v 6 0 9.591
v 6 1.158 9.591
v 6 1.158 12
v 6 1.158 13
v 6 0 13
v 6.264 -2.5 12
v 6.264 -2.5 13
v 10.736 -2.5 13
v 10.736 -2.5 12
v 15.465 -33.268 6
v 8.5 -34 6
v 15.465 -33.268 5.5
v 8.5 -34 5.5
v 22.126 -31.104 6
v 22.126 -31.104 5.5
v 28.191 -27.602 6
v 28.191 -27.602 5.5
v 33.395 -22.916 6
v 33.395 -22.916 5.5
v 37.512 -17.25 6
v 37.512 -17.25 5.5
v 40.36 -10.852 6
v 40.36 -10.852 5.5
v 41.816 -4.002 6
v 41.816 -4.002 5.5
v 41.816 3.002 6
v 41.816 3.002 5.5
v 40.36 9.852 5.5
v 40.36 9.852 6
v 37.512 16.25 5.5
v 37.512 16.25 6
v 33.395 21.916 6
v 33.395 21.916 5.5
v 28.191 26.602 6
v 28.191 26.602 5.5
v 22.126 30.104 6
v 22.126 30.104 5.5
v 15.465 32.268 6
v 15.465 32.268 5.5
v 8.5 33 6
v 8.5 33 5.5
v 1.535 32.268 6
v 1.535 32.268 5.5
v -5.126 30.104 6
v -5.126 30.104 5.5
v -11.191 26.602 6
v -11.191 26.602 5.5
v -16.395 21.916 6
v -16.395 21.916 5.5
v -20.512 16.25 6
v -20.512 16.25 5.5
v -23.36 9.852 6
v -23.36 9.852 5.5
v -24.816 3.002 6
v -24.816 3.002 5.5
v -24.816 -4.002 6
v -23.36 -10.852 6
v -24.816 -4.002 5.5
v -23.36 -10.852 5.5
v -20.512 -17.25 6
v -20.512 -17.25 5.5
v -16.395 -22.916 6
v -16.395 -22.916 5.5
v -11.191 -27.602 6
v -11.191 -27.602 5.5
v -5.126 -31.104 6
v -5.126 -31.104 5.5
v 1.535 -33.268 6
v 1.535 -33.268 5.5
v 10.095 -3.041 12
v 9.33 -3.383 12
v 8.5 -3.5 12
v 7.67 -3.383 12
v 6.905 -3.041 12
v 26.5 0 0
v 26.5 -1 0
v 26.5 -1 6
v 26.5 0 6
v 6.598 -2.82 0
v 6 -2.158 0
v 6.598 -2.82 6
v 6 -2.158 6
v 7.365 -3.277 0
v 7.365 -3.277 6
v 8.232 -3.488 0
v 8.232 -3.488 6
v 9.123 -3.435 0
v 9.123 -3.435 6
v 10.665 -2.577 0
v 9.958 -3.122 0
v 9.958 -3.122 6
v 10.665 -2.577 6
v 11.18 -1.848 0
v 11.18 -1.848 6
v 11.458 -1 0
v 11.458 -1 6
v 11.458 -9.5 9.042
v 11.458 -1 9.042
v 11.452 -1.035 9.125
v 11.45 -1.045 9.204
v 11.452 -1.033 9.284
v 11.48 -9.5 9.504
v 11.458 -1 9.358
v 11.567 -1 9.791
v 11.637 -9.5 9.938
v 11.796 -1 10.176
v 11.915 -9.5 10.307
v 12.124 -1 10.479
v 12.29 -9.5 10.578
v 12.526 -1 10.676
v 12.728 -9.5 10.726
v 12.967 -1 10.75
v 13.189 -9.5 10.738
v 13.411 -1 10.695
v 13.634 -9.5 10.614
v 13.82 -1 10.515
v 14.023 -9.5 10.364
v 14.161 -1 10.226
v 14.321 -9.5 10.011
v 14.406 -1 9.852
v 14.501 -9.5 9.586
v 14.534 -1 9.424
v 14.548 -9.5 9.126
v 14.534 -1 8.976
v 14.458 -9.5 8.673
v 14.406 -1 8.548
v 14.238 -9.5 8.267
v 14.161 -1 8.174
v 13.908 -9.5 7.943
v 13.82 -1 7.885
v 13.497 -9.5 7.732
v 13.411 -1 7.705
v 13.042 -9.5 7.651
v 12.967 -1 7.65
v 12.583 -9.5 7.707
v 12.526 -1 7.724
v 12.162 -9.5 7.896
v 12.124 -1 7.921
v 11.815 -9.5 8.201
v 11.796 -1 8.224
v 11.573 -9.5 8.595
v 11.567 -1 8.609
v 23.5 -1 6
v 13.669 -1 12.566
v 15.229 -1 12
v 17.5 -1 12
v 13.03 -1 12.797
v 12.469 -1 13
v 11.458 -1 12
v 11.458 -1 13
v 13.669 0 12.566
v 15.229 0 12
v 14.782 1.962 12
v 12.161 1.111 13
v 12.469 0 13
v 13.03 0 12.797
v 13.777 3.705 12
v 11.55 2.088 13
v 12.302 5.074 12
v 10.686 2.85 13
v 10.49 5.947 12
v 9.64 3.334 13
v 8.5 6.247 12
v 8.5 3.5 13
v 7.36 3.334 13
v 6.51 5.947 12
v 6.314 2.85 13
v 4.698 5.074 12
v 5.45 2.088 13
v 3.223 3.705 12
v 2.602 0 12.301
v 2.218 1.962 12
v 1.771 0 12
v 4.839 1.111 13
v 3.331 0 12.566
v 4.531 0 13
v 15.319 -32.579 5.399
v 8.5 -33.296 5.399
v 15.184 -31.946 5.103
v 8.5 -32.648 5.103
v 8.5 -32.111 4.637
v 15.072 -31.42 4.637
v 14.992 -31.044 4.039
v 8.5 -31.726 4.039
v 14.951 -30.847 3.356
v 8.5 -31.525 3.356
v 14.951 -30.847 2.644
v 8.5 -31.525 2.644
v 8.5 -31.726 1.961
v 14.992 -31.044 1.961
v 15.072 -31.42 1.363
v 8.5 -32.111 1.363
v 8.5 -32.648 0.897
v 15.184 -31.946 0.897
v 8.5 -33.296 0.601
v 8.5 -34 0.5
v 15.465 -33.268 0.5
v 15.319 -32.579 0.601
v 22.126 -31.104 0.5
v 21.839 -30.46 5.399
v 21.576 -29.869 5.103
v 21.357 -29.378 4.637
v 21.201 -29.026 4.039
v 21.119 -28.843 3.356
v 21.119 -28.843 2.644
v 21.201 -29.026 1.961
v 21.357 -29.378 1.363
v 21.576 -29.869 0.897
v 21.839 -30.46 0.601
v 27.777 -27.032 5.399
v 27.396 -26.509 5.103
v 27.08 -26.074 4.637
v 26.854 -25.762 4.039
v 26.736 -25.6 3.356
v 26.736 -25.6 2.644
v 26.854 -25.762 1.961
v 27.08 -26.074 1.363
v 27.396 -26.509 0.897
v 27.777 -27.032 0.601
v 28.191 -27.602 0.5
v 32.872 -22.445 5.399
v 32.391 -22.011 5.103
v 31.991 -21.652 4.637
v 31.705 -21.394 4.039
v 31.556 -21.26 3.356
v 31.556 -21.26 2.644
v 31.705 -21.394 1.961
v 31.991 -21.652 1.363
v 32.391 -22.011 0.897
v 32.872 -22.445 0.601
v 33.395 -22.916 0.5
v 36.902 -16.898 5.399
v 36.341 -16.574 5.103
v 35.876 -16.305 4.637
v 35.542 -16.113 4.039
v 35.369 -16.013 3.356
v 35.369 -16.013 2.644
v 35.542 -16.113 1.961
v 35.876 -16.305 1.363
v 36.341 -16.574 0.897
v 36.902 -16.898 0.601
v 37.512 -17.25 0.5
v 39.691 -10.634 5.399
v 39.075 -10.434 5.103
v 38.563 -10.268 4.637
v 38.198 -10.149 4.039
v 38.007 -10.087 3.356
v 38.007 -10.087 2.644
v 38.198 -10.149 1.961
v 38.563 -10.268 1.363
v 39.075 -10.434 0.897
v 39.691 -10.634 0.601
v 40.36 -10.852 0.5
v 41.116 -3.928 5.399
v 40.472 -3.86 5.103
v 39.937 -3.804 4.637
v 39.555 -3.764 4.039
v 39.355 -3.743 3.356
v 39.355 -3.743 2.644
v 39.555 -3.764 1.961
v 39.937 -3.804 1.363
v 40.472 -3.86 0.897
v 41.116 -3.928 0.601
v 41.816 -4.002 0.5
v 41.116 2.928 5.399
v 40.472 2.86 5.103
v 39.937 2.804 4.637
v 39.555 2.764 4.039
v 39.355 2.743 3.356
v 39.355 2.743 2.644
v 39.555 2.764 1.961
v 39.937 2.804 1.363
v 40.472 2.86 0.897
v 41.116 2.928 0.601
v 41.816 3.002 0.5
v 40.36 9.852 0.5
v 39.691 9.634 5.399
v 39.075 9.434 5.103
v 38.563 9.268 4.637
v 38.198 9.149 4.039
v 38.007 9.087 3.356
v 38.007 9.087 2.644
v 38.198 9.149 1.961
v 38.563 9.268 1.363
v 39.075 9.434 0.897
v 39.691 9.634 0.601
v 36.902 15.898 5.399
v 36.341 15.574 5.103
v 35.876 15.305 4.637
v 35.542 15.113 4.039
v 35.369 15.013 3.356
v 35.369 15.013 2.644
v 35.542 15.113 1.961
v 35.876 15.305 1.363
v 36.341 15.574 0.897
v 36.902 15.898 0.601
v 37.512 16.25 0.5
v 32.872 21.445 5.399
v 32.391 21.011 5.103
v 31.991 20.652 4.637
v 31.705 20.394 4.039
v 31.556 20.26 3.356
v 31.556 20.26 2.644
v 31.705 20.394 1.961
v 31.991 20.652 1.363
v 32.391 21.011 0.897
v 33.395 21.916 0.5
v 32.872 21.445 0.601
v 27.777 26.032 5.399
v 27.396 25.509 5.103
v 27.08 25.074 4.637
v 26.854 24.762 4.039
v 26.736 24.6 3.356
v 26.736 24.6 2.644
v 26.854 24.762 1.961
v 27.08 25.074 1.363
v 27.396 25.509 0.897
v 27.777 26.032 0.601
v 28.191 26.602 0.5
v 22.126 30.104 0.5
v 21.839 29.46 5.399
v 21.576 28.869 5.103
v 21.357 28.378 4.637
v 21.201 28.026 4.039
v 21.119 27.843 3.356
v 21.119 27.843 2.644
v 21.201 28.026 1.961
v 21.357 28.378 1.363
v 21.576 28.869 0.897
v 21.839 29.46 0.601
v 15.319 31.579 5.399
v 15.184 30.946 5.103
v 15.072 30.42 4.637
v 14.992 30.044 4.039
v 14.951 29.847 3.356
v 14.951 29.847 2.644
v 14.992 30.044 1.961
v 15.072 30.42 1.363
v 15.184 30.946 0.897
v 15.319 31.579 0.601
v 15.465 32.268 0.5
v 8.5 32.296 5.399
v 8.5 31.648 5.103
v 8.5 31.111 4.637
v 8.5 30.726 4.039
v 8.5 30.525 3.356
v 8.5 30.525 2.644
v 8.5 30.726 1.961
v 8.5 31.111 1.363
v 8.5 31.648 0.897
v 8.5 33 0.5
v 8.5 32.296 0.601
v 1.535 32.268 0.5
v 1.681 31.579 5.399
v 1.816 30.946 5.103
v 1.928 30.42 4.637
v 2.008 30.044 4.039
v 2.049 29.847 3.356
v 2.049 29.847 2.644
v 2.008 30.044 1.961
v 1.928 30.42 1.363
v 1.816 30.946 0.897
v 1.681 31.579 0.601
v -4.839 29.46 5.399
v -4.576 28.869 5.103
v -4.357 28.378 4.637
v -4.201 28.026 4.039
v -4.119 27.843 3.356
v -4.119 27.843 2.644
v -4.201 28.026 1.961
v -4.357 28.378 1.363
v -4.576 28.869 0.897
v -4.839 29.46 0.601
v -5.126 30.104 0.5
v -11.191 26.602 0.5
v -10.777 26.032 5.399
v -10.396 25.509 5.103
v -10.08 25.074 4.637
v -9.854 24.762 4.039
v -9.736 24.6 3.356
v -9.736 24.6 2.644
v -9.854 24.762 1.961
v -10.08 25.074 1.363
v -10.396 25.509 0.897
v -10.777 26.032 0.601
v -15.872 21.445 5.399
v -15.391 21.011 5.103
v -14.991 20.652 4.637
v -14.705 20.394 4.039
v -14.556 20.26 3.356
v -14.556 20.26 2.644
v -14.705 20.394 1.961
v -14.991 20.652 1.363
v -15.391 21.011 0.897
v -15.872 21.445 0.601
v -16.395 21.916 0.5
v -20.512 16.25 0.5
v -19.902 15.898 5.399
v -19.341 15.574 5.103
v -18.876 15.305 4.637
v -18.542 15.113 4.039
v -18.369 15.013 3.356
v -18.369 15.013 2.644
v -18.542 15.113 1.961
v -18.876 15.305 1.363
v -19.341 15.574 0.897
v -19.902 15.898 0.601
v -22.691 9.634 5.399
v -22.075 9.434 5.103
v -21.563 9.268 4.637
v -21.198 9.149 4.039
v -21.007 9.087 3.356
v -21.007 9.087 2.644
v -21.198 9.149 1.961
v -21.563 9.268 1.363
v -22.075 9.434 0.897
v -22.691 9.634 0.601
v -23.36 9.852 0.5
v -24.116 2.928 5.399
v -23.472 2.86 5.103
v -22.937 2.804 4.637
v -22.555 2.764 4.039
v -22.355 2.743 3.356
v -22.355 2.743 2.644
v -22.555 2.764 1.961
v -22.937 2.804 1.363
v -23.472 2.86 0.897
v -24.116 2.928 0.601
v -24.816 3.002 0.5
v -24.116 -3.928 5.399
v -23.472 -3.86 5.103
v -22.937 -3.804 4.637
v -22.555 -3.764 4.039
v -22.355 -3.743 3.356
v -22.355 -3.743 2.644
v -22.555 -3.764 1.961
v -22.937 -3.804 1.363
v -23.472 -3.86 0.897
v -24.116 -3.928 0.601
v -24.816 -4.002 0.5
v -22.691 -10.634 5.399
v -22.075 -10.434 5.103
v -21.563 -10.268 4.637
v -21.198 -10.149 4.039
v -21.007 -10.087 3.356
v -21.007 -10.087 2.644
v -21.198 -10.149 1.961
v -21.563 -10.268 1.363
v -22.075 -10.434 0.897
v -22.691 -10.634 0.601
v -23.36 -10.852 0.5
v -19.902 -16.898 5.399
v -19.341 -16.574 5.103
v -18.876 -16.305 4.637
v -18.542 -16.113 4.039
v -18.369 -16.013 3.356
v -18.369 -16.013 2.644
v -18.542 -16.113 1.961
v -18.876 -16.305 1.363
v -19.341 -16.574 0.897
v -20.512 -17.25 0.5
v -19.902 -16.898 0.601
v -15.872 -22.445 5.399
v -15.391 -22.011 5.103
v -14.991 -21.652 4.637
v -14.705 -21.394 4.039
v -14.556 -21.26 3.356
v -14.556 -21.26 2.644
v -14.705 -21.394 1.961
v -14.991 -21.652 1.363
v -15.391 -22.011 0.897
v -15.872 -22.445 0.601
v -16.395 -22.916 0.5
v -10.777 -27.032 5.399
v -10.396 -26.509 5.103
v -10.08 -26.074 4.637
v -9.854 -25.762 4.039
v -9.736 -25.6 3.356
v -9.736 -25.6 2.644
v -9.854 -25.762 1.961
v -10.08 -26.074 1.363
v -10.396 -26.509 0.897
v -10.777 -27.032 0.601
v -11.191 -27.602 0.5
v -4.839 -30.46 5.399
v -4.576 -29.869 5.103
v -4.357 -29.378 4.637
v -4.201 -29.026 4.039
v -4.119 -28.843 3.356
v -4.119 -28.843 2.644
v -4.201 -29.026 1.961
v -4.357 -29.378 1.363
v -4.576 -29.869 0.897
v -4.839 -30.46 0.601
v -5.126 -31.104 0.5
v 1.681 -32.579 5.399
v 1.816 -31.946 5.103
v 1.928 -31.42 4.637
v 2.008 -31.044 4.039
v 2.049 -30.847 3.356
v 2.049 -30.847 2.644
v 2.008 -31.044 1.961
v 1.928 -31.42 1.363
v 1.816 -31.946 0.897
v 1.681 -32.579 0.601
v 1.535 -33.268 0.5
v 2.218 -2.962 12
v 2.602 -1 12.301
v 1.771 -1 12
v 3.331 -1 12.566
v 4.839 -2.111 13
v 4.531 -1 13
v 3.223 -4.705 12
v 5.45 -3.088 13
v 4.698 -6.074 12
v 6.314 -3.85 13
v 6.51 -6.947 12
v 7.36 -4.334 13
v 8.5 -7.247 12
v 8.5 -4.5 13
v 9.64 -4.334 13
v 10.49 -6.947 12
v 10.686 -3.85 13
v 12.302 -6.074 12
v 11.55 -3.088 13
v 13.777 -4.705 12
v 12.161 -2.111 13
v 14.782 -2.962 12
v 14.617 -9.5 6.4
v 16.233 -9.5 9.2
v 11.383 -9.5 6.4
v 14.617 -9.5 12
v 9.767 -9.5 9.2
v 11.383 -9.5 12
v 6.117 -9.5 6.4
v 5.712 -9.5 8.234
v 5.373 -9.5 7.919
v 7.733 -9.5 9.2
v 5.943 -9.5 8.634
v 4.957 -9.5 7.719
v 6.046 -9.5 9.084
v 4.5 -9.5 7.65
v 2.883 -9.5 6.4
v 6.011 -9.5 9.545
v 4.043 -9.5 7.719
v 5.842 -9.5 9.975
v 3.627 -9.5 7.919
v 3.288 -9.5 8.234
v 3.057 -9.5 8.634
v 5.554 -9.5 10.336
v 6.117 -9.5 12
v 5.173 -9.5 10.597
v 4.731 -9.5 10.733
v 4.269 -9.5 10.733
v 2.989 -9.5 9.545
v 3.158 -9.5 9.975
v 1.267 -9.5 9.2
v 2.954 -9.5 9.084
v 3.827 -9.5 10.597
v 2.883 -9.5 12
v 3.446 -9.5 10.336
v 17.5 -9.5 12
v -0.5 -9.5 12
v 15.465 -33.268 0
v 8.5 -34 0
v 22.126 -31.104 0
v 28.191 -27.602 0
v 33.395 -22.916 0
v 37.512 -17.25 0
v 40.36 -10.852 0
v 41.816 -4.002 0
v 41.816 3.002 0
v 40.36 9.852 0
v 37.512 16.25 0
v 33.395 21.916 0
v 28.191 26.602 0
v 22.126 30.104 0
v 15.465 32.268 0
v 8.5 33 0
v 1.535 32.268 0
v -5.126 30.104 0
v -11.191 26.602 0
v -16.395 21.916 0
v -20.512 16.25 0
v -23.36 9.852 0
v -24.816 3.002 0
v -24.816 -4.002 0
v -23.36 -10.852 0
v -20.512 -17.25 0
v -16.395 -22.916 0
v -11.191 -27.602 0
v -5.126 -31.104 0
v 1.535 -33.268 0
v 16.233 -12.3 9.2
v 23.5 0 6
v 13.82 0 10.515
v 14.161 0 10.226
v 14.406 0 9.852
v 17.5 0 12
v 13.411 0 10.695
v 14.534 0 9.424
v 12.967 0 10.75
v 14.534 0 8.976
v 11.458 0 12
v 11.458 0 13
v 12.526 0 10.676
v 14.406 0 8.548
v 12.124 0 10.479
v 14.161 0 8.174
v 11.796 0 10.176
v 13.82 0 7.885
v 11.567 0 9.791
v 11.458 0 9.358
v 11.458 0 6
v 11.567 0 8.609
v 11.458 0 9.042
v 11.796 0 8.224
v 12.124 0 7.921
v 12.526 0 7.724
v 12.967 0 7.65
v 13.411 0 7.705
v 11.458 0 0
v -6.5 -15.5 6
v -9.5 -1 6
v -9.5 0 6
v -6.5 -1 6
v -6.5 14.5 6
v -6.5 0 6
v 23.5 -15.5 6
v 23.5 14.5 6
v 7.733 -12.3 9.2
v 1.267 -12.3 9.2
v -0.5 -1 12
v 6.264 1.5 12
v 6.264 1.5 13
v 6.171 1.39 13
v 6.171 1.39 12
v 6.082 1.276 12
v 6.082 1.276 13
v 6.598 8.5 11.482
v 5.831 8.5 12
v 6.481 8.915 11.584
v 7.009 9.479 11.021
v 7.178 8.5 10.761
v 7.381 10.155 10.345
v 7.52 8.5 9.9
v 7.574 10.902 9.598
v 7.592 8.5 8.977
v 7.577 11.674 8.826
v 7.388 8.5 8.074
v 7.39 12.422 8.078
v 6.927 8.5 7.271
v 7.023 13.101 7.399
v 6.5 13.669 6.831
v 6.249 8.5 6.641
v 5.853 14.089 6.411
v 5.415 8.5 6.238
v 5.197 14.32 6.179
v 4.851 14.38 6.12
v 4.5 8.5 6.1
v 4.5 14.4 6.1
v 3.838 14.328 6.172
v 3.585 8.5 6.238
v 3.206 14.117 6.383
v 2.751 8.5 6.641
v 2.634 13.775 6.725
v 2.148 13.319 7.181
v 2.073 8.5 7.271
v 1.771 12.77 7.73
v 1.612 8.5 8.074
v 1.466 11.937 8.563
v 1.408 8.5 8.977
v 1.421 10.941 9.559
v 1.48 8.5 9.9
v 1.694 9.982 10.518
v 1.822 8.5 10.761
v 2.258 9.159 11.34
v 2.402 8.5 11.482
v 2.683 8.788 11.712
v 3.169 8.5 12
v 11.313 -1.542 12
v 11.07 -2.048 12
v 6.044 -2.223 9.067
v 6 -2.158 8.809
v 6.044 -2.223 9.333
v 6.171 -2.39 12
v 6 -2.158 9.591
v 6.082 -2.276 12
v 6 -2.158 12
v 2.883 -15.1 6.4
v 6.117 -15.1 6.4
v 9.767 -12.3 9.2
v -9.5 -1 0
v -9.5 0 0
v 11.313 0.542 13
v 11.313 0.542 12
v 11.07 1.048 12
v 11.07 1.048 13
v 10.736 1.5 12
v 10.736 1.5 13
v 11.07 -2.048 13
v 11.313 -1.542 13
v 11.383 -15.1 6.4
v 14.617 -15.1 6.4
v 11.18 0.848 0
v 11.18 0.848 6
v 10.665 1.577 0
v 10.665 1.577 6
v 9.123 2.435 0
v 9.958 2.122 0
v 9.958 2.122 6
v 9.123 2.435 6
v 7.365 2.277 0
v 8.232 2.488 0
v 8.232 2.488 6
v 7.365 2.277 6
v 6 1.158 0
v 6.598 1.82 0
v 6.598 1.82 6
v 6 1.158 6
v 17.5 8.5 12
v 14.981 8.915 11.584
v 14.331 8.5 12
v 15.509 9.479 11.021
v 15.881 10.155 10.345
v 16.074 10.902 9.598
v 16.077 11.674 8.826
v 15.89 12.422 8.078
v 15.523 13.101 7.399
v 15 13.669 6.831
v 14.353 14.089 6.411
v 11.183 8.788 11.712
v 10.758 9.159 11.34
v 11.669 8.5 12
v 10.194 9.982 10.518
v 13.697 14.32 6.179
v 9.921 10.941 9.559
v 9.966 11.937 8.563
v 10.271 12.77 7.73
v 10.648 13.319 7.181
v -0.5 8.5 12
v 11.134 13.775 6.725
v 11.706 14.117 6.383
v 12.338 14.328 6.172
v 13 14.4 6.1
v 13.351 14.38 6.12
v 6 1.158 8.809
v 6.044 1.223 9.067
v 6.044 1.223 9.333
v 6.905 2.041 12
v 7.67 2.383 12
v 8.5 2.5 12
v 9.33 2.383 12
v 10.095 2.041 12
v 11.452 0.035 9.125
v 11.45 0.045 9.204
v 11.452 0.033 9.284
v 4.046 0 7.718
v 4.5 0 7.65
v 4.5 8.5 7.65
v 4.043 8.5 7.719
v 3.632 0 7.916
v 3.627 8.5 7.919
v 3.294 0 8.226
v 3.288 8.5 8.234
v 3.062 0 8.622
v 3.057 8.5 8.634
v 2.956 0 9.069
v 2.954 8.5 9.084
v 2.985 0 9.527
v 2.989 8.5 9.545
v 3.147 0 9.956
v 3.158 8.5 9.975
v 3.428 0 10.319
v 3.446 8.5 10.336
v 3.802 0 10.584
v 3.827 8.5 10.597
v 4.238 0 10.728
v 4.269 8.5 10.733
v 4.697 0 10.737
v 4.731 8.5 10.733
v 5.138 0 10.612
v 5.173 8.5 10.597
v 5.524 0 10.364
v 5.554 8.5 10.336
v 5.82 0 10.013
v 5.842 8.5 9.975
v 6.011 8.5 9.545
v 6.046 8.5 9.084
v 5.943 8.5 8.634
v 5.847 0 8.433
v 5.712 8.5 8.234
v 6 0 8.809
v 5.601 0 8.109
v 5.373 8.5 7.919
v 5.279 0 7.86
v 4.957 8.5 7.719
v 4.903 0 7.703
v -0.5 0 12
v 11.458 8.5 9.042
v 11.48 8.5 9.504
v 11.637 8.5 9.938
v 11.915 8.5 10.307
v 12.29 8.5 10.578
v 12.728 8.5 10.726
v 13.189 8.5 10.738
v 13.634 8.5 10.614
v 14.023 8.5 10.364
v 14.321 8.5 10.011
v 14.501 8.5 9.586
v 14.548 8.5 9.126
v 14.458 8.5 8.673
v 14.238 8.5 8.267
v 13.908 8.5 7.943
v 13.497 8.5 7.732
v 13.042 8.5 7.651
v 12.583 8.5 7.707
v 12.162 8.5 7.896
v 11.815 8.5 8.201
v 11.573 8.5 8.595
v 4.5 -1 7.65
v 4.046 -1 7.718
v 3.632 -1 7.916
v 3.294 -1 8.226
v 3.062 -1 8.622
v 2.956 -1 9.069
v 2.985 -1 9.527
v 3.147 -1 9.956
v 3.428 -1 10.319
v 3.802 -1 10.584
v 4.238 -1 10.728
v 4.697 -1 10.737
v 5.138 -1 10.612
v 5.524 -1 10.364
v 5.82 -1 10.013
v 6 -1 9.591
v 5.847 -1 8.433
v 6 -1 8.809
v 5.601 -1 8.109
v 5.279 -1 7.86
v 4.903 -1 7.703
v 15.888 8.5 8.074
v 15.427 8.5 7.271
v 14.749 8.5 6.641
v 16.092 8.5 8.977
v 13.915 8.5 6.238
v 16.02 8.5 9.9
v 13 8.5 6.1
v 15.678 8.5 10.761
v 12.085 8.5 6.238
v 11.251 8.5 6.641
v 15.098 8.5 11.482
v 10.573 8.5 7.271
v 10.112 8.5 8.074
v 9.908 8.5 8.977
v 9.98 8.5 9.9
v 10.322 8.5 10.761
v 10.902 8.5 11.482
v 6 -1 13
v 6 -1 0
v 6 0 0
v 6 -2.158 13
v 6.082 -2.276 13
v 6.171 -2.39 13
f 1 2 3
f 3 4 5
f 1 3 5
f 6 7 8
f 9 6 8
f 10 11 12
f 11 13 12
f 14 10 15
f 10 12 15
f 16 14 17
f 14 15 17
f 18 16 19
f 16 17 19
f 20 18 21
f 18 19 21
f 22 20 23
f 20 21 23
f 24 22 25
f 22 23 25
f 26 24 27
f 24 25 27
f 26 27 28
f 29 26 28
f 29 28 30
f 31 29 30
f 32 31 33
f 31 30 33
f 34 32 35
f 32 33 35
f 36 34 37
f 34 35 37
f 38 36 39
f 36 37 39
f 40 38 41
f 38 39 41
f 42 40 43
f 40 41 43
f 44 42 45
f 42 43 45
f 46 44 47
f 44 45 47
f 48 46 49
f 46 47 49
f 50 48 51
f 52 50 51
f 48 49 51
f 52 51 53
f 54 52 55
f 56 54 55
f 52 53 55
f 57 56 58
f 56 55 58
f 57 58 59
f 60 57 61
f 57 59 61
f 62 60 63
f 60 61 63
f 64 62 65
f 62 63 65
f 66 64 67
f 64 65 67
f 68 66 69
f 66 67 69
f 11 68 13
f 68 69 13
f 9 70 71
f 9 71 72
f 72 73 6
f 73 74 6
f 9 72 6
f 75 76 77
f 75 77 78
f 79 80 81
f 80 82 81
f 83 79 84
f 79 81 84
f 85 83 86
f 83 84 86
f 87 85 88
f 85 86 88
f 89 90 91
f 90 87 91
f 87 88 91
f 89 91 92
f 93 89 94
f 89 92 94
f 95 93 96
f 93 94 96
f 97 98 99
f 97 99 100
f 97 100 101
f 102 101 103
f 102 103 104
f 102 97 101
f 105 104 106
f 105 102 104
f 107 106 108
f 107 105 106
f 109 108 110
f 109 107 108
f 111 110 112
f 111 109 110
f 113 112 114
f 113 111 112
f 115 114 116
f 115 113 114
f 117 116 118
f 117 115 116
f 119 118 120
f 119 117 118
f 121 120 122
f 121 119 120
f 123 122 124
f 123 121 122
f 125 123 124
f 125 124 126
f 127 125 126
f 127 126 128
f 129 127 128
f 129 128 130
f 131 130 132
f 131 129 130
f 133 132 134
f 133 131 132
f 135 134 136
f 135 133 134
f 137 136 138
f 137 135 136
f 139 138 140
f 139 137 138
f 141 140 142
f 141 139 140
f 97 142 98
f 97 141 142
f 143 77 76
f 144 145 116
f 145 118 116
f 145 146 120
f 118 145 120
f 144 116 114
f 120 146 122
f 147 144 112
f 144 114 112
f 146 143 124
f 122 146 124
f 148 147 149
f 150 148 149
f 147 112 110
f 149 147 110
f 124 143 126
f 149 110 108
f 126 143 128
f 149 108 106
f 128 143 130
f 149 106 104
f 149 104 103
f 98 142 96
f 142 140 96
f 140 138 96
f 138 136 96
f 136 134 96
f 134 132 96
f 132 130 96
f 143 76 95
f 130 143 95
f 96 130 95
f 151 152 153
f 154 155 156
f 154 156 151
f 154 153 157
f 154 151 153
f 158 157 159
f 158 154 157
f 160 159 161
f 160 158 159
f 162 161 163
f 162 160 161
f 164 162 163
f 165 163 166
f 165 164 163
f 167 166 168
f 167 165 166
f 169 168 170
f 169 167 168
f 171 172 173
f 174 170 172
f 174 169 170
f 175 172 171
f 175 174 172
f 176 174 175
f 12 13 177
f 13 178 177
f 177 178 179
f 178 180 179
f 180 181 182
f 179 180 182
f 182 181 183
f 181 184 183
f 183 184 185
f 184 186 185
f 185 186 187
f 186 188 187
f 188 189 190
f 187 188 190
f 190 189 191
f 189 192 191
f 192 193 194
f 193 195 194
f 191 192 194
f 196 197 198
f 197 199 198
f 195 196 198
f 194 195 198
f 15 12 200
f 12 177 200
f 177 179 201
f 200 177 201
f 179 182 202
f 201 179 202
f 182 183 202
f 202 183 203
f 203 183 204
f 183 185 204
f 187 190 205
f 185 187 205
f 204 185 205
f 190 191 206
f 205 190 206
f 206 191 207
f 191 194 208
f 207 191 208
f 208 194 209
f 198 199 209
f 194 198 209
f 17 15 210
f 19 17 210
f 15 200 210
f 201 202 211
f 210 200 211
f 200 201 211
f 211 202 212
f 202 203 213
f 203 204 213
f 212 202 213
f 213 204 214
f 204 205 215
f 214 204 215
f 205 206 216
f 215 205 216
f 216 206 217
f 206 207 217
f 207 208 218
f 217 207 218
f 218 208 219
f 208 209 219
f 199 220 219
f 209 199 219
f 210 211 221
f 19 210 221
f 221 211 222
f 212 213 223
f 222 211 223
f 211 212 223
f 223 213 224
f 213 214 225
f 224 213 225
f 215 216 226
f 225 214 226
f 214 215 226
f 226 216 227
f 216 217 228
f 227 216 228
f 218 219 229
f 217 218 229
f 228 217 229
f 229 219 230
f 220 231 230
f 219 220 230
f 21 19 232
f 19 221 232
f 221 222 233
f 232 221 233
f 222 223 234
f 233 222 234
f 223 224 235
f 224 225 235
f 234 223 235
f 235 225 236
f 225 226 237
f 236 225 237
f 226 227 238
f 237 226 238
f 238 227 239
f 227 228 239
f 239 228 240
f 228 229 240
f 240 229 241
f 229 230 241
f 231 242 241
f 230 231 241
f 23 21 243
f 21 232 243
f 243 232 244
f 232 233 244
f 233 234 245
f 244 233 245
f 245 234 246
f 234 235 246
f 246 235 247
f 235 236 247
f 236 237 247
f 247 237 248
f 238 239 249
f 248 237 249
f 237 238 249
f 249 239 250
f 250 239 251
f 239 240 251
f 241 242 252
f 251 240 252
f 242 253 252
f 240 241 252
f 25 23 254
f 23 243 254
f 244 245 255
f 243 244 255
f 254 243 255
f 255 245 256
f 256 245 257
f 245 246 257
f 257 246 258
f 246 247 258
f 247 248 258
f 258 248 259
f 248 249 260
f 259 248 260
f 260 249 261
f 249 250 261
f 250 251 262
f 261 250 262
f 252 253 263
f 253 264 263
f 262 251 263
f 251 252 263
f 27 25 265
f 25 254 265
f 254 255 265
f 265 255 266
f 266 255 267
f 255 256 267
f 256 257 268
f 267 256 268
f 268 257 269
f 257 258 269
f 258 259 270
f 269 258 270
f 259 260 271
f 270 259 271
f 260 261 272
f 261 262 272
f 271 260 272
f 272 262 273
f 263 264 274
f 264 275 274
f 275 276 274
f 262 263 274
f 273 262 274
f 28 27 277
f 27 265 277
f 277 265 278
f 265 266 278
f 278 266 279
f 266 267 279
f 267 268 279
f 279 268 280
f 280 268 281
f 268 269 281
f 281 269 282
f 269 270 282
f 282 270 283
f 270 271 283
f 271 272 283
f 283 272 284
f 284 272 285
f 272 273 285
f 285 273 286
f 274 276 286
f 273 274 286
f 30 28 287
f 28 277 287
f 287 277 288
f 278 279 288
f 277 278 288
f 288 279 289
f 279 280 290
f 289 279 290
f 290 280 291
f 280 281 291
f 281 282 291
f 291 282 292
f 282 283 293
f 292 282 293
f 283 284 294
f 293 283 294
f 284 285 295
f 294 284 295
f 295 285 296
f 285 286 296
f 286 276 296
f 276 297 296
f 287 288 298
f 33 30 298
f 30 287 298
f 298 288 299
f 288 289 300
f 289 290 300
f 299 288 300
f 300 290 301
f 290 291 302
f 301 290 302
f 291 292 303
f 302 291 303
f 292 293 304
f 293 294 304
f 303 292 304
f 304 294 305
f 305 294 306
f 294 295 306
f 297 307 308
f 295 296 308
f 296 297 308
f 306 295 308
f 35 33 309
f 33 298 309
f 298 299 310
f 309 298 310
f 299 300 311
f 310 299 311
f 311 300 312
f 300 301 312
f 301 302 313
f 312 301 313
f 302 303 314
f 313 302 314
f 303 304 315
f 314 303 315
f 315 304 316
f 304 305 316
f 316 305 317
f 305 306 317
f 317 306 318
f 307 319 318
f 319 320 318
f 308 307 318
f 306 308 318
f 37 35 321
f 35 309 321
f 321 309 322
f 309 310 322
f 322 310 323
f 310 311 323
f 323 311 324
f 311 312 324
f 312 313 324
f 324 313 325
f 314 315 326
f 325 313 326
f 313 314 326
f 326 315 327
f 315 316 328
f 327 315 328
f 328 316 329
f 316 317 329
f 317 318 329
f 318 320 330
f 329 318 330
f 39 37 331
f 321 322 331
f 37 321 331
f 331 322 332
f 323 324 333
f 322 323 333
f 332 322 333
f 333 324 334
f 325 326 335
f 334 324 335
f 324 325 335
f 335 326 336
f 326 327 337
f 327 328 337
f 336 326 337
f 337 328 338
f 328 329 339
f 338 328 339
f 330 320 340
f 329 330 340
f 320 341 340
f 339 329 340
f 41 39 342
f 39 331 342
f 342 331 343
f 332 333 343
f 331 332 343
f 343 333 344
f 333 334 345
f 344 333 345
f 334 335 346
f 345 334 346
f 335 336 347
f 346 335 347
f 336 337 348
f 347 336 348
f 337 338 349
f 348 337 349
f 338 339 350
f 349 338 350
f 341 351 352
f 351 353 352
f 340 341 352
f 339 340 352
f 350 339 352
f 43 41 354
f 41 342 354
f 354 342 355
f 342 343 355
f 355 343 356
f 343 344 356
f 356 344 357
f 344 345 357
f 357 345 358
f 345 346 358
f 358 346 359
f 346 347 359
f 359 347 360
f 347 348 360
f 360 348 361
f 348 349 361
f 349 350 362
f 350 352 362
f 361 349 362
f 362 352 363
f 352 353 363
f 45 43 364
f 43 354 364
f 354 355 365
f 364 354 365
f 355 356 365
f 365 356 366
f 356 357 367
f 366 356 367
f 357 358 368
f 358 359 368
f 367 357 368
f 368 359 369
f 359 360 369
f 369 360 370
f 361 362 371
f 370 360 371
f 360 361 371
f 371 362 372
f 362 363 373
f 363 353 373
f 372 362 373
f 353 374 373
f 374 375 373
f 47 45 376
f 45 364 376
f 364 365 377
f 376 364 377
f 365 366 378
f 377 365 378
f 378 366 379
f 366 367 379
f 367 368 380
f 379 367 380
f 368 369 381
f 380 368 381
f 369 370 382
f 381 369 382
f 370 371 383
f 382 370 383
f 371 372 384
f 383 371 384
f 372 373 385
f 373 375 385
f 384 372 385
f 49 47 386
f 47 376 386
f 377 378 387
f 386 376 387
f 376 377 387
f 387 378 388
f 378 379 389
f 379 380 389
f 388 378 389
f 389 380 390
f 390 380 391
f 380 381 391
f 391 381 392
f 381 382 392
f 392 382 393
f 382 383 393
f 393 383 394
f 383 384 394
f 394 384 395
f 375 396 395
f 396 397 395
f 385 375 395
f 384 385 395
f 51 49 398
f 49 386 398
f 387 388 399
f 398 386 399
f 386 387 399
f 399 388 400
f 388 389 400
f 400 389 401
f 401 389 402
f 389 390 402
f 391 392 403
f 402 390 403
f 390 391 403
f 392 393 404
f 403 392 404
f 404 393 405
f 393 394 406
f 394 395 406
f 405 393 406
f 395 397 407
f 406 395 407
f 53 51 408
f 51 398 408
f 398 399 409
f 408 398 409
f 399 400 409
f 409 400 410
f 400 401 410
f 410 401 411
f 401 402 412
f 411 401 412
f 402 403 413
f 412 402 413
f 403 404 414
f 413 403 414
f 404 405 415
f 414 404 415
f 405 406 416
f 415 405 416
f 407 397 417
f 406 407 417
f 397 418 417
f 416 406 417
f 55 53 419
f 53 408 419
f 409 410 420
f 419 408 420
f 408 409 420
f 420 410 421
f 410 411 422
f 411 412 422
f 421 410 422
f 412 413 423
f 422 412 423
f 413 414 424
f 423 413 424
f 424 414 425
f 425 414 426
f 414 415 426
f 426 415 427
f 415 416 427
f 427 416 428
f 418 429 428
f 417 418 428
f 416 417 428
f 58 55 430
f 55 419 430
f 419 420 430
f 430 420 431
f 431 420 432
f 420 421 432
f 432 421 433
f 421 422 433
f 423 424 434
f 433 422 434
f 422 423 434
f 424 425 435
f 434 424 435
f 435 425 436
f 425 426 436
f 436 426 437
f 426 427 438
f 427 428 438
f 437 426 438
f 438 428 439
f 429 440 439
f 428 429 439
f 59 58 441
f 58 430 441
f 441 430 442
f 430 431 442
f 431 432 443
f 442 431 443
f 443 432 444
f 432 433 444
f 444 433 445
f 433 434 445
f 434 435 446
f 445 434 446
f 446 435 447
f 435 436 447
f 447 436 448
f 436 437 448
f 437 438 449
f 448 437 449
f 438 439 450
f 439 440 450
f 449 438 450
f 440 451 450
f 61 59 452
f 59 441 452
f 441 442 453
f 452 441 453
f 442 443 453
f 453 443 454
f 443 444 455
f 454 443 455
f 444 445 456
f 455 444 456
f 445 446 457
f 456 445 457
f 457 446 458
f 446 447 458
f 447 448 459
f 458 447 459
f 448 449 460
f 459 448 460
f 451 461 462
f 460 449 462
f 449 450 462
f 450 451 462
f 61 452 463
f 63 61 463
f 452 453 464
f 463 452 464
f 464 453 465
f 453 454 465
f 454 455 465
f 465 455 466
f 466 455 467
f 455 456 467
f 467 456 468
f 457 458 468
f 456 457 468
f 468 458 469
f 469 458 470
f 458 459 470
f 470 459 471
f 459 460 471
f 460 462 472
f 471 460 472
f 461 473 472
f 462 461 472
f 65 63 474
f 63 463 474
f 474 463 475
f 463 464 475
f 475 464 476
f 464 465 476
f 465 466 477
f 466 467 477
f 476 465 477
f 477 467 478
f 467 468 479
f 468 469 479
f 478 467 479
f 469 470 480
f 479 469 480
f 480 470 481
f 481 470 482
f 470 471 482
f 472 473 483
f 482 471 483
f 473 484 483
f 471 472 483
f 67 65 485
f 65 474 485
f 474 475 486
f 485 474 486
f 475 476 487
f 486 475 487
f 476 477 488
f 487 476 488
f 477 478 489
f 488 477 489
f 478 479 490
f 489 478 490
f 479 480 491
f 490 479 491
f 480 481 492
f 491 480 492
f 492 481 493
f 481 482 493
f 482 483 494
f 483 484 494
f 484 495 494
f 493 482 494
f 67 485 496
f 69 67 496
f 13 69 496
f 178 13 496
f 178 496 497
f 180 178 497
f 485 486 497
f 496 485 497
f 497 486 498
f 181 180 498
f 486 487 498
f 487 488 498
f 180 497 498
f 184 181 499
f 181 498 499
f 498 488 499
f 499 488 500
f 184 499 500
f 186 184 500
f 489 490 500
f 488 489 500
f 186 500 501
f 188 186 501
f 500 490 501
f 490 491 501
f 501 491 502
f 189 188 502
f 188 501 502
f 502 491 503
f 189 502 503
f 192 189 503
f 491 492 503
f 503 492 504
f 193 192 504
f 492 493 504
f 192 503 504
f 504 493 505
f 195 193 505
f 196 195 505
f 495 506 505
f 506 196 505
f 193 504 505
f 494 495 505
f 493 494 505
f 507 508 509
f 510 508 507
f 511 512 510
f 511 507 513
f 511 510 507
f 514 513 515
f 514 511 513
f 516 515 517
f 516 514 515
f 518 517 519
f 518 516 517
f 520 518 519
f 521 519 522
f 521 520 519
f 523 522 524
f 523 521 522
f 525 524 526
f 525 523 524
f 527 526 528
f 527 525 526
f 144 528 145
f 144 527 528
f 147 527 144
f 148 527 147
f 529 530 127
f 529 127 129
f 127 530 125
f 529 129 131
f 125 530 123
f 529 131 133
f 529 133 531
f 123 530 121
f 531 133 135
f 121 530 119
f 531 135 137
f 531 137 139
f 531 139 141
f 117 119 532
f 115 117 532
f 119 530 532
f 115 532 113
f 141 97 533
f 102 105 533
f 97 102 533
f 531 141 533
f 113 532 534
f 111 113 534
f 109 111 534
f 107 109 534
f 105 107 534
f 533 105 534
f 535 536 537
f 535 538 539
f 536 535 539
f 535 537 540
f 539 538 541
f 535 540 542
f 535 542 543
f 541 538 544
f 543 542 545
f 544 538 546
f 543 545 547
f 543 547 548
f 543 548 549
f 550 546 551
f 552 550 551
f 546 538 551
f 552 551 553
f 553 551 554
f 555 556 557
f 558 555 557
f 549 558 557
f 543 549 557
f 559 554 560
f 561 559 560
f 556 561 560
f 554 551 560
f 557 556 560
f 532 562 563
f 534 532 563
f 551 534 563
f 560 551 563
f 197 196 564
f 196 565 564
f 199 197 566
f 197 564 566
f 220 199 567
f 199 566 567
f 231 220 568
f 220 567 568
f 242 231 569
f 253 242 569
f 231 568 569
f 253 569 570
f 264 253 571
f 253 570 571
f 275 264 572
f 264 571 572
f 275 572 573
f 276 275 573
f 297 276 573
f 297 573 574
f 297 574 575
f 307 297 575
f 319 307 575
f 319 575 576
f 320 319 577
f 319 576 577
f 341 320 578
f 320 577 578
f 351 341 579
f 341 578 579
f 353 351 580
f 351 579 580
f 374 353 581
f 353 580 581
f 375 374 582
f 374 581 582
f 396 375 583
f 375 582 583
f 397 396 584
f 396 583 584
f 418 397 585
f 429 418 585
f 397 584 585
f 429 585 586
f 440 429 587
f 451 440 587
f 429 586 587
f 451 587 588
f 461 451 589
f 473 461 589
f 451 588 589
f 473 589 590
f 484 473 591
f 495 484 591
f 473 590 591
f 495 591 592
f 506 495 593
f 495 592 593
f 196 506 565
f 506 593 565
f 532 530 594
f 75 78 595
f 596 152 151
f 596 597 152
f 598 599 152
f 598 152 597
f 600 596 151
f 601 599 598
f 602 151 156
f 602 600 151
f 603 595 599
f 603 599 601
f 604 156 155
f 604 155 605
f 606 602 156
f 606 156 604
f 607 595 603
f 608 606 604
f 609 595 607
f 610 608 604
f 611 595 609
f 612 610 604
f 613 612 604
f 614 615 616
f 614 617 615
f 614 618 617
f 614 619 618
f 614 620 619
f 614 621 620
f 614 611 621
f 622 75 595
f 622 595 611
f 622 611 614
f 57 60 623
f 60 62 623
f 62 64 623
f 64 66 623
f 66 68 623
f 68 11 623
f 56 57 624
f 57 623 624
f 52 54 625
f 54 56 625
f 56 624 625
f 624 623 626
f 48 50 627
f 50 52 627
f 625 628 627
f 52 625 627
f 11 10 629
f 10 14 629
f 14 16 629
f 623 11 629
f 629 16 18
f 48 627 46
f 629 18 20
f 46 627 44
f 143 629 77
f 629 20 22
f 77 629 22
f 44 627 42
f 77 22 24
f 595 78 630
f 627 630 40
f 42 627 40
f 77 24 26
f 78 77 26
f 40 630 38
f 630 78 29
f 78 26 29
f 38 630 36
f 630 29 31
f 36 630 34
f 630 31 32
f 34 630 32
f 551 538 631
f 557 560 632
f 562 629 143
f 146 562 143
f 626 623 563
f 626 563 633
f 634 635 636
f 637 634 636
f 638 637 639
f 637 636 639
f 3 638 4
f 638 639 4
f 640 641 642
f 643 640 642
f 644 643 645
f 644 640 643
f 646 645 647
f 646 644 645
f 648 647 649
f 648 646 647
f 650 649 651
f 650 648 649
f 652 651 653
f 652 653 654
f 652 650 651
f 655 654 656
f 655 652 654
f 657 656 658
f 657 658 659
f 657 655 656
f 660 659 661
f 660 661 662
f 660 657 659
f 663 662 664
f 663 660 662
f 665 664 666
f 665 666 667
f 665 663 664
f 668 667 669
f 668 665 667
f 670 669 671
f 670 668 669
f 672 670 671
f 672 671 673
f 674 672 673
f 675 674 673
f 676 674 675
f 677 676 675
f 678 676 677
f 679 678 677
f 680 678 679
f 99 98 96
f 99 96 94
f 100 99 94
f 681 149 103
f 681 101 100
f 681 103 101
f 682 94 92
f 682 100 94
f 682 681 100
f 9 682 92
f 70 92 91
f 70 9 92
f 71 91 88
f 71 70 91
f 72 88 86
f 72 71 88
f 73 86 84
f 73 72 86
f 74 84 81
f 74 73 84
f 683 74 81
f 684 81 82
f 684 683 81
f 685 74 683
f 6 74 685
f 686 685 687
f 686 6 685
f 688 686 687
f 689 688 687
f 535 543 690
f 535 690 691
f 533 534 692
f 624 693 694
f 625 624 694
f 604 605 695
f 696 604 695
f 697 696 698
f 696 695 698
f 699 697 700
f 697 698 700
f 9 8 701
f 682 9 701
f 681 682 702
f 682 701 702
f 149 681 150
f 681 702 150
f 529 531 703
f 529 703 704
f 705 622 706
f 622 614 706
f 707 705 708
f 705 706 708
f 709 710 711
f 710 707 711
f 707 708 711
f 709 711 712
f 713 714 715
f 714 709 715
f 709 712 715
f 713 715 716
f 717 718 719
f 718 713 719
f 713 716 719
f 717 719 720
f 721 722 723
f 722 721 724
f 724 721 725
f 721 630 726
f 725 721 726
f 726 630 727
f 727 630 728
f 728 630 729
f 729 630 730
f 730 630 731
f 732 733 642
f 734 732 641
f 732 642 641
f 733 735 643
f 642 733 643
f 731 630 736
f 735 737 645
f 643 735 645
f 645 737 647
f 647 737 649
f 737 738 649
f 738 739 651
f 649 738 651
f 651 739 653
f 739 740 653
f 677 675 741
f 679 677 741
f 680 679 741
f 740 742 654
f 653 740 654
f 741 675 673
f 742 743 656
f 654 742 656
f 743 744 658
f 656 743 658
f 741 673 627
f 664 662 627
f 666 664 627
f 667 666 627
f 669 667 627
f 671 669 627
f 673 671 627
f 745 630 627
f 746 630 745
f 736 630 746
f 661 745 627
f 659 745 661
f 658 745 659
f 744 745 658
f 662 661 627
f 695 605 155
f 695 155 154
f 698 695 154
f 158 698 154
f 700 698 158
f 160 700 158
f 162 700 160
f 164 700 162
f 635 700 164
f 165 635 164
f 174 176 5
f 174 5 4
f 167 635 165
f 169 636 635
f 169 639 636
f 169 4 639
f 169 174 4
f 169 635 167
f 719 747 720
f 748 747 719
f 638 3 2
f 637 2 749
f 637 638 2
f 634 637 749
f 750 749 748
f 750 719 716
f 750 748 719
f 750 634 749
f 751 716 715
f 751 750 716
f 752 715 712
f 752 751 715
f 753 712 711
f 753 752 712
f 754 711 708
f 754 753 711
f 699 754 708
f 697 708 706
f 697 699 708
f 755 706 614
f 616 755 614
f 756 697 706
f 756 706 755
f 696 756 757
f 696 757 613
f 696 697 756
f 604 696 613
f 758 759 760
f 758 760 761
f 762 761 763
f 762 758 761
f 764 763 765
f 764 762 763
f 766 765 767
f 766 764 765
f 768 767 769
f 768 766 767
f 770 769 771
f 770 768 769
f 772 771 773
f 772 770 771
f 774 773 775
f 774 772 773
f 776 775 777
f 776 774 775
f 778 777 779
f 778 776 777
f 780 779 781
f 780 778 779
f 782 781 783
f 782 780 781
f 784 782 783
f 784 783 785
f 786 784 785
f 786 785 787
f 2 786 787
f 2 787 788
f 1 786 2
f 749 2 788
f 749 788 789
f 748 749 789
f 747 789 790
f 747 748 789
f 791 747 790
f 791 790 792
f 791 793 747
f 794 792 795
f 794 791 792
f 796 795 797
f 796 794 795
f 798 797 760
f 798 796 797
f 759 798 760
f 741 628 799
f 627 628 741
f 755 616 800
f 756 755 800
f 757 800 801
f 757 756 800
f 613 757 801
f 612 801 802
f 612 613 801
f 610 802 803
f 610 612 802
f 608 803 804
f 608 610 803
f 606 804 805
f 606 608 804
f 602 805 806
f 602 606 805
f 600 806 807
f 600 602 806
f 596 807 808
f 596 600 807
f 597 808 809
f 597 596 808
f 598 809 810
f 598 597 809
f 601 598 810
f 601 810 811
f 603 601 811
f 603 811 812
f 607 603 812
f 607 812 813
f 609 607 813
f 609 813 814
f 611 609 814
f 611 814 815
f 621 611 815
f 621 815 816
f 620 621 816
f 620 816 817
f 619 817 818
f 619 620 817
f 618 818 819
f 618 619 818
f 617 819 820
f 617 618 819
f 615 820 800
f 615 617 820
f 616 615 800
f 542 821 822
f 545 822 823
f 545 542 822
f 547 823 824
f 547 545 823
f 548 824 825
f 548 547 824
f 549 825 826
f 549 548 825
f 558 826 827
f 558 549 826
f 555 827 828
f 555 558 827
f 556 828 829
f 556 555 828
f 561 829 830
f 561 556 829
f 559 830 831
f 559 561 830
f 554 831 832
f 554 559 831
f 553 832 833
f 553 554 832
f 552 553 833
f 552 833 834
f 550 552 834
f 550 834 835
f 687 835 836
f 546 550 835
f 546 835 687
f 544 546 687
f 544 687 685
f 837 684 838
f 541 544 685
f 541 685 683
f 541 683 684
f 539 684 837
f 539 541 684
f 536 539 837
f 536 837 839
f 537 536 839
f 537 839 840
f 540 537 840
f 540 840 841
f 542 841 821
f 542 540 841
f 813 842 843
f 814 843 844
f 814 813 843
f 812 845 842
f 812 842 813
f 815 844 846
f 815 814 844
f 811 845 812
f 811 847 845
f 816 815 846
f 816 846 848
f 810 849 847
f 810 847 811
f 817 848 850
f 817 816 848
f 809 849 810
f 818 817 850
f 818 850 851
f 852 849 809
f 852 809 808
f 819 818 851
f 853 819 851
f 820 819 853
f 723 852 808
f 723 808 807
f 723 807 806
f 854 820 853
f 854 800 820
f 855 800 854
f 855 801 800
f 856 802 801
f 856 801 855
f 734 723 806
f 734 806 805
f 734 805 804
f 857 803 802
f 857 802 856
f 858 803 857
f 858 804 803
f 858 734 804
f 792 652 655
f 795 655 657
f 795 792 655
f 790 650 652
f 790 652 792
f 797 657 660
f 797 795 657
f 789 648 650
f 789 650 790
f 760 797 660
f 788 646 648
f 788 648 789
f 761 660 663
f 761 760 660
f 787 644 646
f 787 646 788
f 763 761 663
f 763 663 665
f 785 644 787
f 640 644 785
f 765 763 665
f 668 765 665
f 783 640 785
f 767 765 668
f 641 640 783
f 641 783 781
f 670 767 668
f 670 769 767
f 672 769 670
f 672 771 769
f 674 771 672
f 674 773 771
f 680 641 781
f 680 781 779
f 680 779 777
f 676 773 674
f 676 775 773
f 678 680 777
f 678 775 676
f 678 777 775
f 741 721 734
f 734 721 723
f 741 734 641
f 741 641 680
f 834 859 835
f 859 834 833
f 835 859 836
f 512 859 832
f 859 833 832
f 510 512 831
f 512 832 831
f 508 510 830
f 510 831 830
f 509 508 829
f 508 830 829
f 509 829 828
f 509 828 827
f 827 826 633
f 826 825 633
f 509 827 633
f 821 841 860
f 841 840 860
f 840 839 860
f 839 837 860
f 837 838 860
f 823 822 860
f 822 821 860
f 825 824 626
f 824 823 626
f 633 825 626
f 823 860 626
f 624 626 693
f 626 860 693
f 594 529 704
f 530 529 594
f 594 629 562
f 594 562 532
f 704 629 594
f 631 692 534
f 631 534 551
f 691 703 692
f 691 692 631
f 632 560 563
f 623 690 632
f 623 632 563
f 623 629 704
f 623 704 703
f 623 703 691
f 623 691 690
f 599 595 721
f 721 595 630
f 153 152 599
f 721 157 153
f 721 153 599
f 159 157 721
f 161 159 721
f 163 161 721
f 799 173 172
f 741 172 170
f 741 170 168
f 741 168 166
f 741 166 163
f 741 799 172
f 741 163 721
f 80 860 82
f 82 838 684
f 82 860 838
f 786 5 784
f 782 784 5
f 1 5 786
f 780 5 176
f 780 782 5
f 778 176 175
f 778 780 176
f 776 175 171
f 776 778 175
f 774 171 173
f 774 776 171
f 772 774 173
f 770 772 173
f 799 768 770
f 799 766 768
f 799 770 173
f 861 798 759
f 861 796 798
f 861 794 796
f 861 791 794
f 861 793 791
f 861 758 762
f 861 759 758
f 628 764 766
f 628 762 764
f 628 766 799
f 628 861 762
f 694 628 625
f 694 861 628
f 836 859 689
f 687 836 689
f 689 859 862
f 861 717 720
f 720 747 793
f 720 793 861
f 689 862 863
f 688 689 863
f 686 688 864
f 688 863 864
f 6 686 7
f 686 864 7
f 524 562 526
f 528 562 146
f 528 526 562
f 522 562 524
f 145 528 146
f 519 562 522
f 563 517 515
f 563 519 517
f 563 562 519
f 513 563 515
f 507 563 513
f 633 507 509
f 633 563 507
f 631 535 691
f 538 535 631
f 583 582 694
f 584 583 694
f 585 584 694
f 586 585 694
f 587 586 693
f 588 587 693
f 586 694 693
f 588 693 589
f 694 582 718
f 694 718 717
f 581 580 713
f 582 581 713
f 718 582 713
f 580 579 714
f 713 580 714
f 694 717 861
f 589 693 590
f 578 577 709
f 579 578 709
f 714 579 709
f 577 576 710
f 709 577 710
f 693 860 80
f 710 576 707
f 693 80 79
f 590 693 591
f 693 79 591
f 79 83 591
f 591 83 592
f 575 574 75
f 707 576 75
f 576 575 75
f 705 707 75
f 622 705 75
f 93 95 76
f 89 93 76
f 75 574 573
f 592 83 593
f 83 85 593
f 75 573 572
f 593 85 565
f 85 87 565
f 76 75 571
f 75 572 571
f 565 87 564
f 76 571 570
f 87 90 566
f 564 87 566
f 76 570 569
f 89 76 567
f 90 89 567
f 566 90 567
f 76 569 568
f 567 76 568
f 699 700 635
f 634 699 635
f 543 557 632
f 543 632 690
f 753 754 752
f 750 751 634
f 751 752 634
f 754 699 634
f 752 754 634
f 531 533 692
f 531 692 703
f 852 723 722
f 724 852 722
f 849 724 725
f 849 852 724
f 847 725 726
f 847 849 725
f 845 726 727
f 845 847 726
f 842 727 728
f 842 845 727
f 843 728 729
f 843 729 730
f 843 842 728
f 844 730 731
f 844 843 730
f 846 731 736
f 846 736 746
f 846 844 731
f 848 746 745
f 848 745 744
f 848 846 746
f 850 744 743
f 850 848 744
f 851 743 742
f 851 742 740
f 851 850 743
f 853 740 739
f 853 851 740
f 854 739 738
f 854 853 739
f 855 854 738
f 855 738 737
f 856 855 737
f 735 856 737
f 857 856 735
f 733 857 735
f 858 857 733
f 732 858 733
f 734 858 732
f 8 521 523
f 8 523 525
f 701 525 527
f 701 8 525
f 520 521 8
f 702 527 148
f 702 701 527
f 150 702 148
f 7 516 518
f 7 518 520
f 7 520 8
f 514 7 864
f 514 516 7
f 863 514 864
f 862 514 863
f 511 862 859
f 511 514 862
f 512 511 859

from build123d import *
from build123d.topology import SkipClean

# Parameters (mm, degrees)
SKETCH3_R               = 3
CUT_EXTRUDE1_DEPTH      = 48.754580932
SKETCH4_W               = 8
SKETCH4_H               = 1
BOSS_EXTRUDE1_DEPTH     = 6
BOSS_EXTRUDE2_START     = 6
SKETCH5_W               = 18
SKETCH5_H               = 18
BOSS_EXTRUDE2_DEPTH     = 6
BOSS_EXTRUDE3_START     = 1
SKETCH13_R              = 4
BOSS_EXTRUDE3_DEPTH     = 1
CHAMFER1_SIZE           = 6
CHAMFER2_SIZE2          = 1
CHAMFER2_SIZE           = 2.747477419
CUT_EXTRUDE2_DEPTH      = 49.872282533
CUT_EXTRUDE2_DEPTH_BACK = 49.872282533
SKETCH6_W               = 1
SKETCH6_H               = 36
CUT_EXTRUDE5_DEPTH      = 49.420037175
CUT_EXTRUDE5_DEPTH_BACK = 49.420037175
SKETCH7_R               = 1.55
CUT_EXTRUDE6_START      = 9
CUT_EXTRUDE6_DEPTH      = 40.420037195
CUT_EXTRUDE7_START      = 9
SKETCH9_R               = 3.1
CUT_EXTRUDE7_DEPTH      = 40.420037195
SKETCH11_R              = 2.5
BODY_MOVE_COPY1_ANGLE   = 180


with BuildPart() as part:
    # Sketch2 → Revolve1 (revolve)
    with BuildSketch(Plane(origin=(0, 0, 0), x_dir=(1, 0, 0), z_dir=(0, 1, 0))):
        with BuildLine():
            Line((0, 0), (0, 3))
            Line((0, 3), (33.5, 3))
            Line((33.5, 3), (33.5, 2.5))
            ThreePointArc((33.5, 2.5), (31, 0), (33.5, -2.5))
            Line((33.5, -2.5), (33.5, -3))
            Line((33.5, -3), (0, -3))
            Line((0, -3), (0, 0))
        make_face()
    revolve(axis=Axis((0, 0, 0), (0, 0, -1)))

    # Sketch3 → Cut-Extrude1 (cut, through all)
    with BuildSketch(Plane(origin=(0, 0, -3), x_dir=(-1, 0, 0), z_dir=(0, 0, -1))):
        Circle(SKETCH3_R)
    extrude(amount=-CUT_EXTRUDE1_DEPTH, mode=Mode.SUBTRACT)

    # Sketch4 → Boss-Extrude1 (add)
    with BuildSketch(Plane(origin=(0, 0, -3), x_dir=(-1, 0, 0), z_dir=(0, 0, -1))):
        with Locations((0, 3)):
            Rectangle(SKETCH4_W, SKETCH4_H)
    extrude(amount=-BOSS_EXTRUDE1_DEPTH)

    # Sketch5 → Boss-Extrude2 (add)
    with BuildSketch(Plane(origin=(0, 0, -3), x_dir=(-1, 0, 0), z_dir=(0, 0, -1)).offset(BOSS_EXTRUDE2_START)):
        Rectangle(SKETCH5_W, SKETCH5_H)
        with BuildLine():
            Line((-1.658312395, 2.5), (1.658312395, 2.5))
            ThreePointArc((1.658312395, 2.5), (0, -3), (-1.658312395, 2.5))
        make_face(mode=Mode.SUBTRACT)
    extrude(amount=-BOSS_EXTRUDE2_DEPTH)

    # Sketch13 → Boss-Extrude3 (add)
    with SkipClean():  # the faces are left unmerged after this step: merging them gives an invalid solid
        with BuildSketch(Plane(origin=(0, 0, -9), x_dir=(-1, 0, 0), z_dir=(0, 0, -1)).offset(BOSS_EXTRUDE3_START)):
            Circle(SKETCH13_R)
            with BuildLine():
                Line((1.658312395, 2.5), (-1.658312395, 2.5))
                ThreePointArc((-1.658312395, 2.5), (-1.833910419, 2.374188825), (-2, 2.236067977))
                Line((-2, 2.236067977), (-2, -2.236067977))
                ThreePointArc((-2, -2.236067977), (0, -3), (2, -2.236067977))
                Line((2, -2.236067977), (2, 2.236067977))
                ThreePointArc((2, 2.236067977), (1.833910419, 2.374188825), (1.658312395, 2.5))
            make_face(mode=Mode.SUBTRACT)
        extrude(amount=-BOSS_EXTRUDE3_DEPTH)

    # Chamfer1
    chamfer1_edges = [part.edges().sort_by_distance(p)[0] for p in [
        (0, -9, -3),
        (0, 9, -3),
        (9, 0, -3),
        (-9, 0, -3),
    ]]
    chamfer(chamfer1_edges, length=CHAMFER1_SIZE - 0.0001)  # a hair under: the kernel refuses the full size

    # Chamfer2
    chamfer2_edges = [part.edges().sort_by_distance(p)[0] for p in [
        (4, 0, -9),
    ]]
    chamfer2_side = [part.faces().sort_by_distance(p)[0] for p in [
        (4.02, 0, -9),
    ]]
    chamfer(chamfer2_edges, length=CHAMFER2_SIZE - 0.0001, length2=CHAMFER2_SIZE2 - 0.0001, reference=chamfer2_side[0])  # a hair under: the kernel refuses the full size

    # Sketch6 → Cut-Extrude2 (cut, two sides: drawn at the far end of the back side and taken through both)
    with BuildSketch(Plane(origin=(0, 0, -9), x_dir=(-1, 0, 0), z_dir=(0, 0, -1)).offset(-CUT_EXTRUDE2_DEPTH_BACK)):
        Rectangle(SKETCH6_W, SKETCH6_H)
    extrude(amount=CUT_EXTRUDE2_DEPTH + CUT_EXTRUDE2_DEPTH_BACK, mode=Mode.SUBTRACT)

    # Sketch7 → Cut-Extrude5 (cut, two sides: drawn at the far end of the back side and taken through both)
    with BuildSketch(Plane.ZY.offset(-CUT_EXTRUDE5_DEPTH_BACK)):
        with Locations((-6.2, 4)):
            Circle(SKETCH7_R)
        with Locations(Location((-6.2, -4.5, 0), (0, 0, 84.161721877))):
            Circle(SKETCH7_R)
    extrude(amount=CUT_EXTRUDE5_DEPTH + CUT_EXTRUDE5_DEPTH_BACK, mode=Mode.SUBTRACT)

    # Sketch8 → Cut-Extrude6 (cut, through all)
    with BuildSketch(Plane(origin=(0, 0, 0), x_dir=(0, 0, -1), z_dir=(1, 0, 0)).offset(CUT_EXTRUDE6_START)):
        Polygon((6.2, 7.233161507), (3.4, 5.616580754), (3.4, 2.383419246), (6.2, 0.766838493), (9, 2.383419246), (9, 5.616580754), align=None)
        Polygon((9, -2.883419246), (6.2, -1.266838493), (3.4, -2.883419246), (3.4, -6.116580754), (6.2, -7.733161507), (9, -6.116580754), align=None)
    extrude(amount=CUT_EXTRUDE6_DEPTH, mode=Mode.SUBTRACT)

    # Sketch9 → Cut-Extrude7 (cut, through all)
    with BuildSketch(Plane.ZY.offset(CUT_EXTRUDE7_START)):
        with Locations((-6.2, 4)):
            Circle(SKETCH9_R)
        with Locations((-6.2, -4.5)):
            Circle(SKETCH9_R)
    extrude(amount=CUT_EXTRUDE7_DEPTH, mode=Mode.SUBTRACT)


with BuildPart() as body_2:
    # Sketch11 → Revolve2 (revolve)
    with BuildSketch(Plane(origin=(0, 0, 0), x_dir=(1, 0, 0), z_dir=(0, 1, 0)), mode=Mode.PRIVATE) as revolve2_sk:
        with Locations((33.5, 0)):
            Circle(SKETCH11_R)
    revolve(revolve2_sk.sketch.rotate(Axis((0, 0, 0), (0, 0, 1)), 180), axis=Axis((0, 0, 0), (0, 0, 1)))


with BuildPart() as part_1:
    # Body-Move/Copy1: read off the stored shape, not the designer's step
    # Body-Move/Copy1: moved
    add(part.part.moved(Location((0.5, -8.5, -3))).rotate(Axis((0, 0, 0), (0.7071067812, -0.7071067812, 0)), BODY_MOVE_COPY1_ANGLE))


solid = part_1.part
